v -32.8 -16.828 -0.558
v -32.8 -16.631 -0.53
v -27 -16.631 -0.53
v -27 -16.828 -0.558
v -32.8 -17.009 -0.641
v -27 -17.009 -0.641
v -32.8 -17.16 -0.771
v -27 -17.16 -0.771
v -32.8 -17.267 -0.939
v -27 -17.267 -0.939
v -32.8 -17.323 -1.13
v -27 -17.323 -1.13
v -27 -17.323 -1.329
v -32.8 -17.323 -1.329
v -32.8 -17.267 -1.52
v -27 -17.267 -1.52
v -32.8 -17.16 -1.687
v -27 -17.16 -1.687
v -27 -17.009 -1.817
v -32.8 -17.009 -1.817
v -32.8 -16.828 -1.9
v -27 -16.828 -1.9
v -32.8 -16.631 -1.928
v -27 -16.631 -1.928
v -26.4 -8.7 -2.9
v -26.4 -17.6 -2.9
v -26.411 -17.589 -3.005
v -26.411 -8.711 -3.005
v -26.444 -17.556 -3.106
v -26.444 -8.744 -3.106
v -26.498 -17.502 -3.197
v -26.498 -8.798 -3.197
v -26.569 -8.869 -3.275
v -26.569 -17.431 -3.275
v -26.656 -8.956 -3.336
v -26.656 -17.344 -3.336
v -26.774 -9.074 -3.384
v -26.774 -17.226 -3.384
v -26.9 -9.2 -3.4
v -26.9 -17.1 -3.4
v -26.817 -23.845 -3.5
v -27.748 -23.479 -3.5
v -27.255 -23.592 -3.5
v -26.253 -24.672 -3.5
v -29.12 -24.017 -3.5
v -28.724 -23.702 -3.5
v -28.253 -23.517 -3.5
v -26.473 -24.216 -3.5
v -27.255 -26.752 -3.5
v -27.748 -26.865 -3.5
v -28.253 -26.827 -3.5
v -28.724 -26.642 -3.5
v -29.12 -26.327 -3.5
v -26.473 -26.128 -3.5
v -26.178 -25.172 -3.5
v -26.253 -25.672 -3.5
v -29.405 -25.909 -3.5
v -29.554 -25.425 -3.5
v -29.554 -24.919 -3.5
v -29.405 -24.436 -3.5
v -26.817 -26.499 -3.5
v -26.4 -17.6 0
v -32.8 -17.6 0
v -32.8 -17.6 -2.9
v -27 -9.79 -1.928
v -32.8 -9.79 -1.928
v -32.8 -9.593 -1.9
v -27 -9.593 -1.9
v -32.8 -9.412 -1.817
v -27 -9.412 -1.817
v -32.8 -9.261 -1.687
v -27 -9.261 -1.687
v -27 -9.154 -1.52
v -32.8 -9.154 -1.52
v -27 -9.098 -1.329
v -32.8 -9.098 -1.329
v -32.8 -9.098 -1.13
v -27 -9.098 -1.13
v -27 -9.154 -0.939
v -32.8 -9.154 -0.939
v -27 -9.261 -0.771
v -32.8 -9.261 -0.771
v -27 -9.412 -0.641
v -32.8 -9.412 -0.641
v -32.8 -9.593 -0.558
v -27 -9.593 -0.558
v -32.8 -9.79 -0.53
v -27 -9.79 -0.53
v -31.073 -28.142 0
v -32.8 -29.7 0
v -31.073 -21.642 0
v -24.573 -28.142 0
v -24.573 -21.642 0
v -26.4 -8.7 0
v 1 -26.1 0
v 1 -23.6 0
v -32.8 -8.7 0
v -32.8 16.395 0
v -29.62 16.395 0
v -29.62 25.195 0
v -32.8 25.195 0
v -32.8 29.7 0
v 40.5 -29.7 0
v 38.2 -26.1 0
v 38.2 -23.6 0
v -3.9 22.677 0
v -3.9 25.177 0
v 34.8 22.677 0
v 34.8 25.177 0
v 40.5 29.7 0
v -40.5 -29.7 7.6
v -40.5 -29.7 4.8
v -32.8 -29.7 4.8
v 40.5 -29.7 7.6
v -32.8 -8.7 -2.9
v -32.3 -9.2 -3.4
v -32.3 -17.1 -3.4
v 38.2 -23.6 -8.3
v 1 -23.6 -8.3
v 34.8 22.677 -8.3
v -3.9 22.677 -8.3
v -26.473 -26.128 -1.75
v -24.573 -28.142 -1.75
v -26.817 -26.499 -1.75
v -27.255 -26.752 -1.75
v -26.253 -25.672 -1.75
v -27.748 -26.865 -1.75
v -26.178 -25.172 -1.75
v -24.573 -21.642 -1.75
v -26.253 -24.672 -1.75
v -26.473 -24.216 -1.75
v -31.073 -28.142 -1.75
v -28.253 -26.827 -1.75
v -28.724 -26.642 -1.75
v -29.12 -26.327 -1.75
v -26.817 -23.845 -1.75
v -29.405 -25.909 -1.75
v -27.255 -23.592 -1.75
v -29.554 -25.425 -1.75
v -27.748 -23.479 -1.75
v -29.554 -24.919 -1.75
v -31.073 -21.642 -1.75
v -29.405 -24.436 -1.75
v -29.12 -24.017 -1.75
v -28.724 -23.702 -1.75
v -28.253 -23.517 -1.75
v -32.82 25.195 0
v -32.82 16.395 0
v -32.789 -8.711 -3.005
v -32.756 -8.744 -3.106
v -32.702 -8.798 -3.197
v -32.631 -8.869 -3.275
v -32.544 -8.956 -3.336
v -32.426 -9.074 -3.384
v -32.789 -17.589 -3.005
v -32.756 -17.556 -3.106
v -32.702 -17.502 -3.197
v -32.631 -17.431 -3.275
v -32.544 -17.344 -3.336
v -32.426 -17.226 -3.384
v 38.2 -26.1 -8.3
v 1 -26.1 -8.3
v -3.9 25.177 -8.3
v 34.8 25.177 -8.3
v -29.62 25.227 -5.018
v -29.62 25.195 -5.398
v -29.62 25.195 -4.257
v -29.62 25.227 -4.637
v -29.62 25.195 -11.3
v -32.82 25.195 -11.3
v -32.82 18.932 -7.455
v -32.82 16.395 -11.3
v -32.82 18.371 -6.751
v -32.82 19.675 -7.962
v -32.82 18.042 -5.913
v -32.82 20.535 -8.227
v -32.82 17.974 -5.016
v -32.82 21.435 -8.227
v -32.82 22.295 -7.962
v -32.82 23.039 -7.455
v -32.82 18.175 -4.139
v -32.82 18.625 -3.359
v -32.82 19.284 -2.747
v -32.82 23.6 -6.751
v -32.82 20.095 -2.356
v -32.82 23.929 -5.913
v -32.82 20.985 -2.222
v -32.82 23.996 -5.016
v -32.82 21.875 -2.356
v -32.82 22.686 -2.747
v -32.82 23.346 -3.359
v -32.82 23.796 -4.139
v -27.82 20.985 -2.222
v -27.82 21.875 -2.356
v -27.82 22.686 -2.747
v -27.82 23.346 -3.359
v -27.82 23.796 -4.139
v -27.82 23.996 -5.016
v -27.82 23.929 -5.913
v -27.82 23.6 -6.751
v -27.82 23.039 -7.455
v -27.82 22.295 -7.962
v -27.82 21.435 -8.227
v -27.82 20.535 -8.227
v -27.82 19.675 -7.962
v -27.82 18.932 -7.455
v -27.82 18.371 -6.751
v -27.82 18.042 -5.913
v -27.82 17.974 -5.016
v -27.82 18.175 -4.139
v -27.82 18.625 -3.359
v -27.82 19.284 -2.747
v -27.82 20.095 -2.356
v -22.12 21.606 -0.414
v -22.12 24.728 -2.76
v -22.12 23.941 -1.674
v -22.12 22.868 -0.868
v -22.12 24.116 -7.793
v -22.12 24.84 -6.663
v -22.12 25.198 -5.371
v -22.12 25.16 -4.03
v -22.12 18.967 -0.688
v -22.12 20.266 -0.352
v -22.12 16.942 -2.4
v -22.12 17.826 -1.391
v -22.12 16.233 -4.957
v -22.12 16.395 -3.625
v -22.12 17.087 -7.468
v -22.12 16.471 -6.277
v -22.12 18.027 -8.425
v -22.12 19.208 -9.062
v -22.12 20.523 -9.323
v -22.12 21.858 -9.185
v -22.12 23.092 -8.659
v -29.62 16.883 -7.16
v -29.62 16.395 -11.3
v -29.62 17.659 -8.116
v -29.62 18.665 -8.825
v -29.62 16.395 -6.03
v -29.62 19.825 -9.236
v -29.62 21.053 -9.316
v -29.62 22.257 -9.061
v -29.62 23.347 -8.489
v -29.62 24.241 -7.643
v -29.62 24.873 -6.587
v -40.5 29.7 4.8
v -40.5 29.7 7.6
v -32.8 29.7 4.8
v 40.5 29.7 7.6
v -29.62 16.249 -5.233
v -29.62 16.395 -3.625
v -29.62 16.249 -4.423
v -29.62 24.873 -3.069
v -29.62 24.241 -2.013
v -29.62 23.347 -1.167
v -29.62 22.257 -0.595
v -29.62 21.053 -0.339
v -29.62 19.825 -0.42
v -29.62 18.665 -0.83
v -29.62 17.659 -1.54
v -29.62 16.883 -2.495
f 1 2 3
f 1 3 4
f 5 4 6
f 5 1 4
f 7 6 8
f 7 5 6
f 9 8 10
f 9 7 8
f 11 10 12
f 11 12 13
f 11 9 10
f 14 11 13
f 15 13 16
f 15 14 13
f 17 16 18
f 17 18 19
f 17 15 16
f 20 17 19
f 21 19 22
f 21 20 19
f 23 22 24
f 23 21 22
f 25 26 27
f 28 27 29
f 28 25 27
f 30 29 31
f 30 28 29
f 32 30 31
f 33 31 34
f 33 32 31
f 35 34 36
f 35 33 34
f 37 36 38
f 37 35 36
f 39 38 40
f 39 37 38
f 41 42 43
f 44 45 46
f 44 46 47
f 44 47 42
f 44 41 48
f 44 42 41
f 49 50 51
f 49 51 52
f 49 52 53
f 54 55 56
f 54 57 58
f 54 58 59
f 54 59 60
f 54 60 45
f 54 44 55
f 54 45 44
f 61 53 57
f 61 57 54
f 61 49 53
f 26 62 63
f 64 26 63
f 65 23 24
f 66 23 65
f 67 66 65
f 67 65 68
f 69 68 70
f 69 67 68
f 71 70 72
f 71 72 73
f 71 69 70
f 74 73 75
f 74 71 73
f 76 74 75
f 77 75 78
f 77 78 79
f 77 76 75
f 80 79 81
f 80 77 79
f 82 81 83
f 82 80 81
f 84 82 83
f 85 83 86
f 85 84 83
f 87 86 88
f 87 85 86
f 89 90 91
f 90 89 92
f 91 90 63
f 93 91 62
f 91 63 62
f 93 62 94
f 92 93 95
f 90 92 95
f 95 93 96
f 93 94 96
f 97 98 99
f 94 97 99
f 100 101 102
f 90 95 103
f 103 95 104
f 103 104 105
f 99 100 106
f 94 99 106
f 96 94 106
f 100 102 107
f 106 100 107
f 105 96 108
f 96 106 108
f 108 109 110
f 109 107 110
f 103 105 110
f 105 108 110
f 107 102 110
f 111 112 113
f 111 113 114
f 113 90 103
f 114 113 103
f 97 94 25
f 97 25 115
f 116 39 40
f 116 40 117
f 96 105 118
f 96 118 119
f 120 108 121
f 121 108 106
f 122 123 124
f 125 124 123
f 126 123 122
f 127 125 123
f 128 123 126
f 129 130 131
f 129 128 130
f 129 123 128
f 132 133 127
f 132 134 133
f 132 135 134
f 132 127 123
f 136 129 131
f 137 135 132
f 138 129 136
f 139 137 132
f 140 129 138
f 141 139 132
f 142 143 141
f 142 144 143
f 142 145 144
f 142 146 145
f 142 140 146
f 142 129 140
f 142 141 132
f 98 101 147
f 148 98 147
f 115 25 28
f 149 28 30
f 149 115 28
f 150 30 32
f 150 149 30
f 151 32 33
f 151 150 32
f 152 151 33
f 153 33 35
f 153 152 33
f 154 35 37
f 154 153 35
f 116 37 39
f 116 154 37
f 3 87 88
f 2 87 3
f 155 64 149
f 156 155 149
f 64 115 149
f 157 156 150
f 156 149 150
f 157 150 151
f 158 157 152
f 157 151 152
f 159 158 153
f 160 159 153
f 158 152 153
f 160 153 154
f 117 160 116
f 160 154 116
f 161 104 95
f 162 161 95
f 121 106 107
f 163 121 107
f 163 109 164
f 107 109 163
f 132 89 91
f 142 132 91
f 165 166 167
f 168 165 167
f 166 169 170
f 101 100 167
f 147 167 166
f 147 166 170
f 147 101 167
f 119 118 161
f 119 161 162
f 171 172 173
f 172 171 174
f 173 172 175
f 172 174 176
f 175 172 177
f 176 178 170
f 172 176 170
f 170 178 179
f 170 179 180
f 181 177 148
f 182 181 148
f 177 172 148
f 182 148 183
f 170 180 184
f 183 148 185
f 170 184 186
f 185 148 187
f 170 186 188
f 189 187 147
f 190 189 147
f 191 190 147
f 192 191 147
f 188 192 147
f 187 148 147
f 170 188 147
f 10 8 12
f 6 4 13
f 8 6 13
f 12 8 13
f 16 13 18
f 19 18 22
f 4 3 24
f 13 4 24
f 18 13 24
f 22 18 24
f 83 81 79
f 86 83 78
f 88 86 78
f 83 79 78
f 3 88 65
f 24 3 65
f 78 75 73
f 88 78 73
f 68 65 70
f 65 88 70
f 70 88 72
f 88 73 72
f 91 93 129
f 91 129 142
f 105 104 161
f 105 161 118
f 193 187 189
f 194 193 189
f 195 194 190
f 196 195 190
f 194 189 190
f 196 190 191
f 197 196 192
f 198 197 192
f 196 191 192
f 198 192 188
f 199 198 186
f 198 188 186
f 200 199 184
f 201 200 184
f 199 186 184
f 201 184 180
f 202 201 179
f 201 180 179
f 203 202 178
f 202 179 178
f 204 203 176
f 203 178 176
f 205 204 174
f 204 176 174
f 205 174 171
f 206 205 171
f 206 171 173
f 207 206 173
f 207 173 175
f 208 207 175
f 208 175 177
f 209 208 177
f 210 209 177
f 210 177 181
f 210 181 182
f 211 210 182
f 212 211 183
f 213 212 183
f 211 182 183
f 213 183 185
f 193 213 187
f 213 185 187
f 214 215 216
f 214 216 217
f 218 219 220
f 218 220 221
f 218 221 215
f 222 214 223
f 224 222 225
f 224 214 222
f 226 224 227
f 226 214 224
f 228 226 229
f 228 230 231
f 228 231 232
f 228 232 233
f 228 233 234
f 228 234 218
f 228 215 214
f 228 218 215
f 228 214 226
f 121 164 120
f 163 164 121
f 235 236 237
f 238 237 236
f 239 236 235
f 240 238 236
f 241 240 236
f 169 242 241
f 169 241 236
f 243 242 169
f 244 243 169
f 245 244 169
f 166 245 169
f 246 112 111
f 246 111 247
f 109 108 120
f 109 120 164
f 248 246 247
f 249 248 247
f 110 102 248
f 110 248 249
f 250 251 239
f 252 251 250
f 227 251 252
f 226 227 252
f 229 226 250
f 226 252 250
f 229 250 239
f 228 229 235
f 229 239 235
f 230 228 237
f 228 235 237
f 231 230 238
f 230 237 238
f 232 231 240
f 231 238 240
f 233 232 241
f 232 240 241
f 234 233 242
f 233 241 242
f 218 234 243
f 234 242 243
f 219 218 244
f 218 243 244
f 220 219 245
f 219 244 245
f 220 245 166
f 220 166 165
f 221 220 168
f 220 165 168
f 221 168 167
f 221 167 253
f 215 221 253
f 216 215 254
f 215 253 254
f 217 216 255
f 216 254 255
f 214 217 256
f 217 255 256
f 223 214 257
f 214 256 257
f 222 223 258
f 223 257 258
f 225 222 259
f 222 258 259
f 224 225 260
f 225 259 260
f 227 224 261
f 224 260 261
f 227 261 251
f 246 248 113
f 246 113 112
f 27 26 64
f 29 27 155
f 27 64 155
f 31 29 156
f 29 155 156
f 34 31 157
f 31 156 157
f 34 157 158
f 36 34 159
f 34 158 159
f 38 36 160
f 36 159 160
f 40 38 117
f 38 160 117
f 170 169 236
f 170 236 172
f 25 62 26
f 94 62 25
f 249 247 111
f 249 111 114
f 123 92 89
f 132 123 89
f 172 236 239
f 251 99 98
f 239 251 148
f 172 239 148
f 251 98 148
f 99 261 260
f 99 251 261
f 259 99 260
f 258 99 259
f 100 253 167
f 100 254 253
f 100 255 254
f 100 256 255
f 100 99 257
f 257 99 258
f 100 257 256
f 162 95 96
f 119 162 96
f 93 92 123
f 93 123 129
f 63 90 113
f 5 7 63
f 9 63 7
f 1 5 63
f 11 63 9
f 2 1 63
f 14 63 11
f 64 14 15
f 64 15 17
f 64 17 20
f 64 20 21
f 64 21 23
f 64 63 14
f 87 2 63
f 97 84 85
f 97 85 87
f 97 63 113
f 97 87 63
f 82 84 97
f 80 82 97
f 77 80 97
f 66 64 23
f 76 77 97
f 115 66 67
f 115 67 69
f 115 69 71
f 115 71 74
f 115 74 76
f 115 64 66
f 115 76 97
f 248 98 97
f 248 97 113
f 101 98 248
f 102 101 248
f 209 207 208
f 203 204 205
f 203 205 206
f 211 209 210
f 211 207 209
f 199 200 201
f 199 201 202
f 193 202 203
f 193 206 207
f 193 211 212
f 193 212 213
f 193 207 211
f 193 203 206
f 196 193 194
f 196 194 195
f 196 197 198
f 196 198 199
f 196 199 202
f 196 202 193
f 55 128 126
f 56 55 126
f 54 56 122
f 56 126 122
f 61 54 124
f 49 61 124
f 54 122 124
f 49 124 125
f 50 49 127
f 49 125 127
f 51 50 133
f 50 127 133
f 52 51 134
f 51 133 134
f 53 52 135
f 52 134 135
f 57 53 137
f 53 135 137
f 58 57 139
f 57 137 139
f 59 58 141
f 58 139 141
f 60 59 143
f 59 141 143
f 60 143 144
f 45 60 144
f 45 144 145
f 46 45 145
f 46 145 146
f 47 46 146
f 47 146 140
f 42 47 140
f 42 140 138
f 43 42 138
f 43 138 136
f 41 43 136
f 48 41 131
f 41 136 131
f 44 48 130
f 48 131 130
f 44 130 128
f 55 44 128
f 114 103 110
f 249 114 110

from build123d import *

# Parameters (mm, degrees)
SKETCH1_W               = 81
SKETCH1_H               = 59.4
CARRIER_BASE_DEPTH      = 7.6
SKETCH2_W               = 7.7
SKETCH2_H               = 59.4
CUT_EXTRUDE1_DEPTH      = 4.8
SKETCH3_W               = 38.7
SKETCH3_H               = 2.5
ANALOG_POWER_BANK_DEPTH = 8.3
SKETCH4_W               = 37.2
SKETCH4_H               = 2.5
DIGITAL_BANK_DEPTH      = 8.3
SKETCH5_W               = 3.2
SKETCH5_H               = 8.8
F_5V_INPUT_DEPTH        = 11.3
SKETCH7_R               = 4.5
BOSS_EXTRUDE6_DEPTH     = 7.5
SKETCH8_R               = 3.019250474
CUT_EXTRUDE2_DEPTH      = 5
SKETCH9_W               = 6.4
SKETCH9_H               = 8.9
USB_C_DEPTH             = 3.4
FILLET3_R               = 0.5
CUT_EXTRUDE3_DEPTH      = 5.8
SKETCH11_W              = 6.5
SKETCH11_H              = 6.5
BOSS_EXTRUDE12_DEPTH    = 1.75
SKETCH12_R              = 1.697531851
RESET_DEPTH             = 1.75


with BuildPart() as part:
    # Sketch1 → Carrier / Base (new body)
    with BuildSketch(Plane.XY):
        Rectangle(SKETCH1_W, SKETCH1_H)
    extrude(amount=CARRIER_BASE_DEPTH)

    # Sketch2 → Cut-Extrude1 (cut)
    with BuildSketch(Plane(origin=(0, 0, 0), x_dir=(-1, 0, 0), z_dir=(0, 0, -1))):
        with Locations((36.65, 0)):
            Rectangle(SKETCH2_W, SKETCH2_H)
    extrude(amount=-CUT_EXTRUDE1_DEPTH, mode=Mode.SUBTRACT)

    # Sketch3 → Analog / Power Bank (add)
    with BuildSketch(Plane(origin=(0, 0, 0), x_dir=(-1, 0, 0), z_dir=(0, 0, -1))):
        with Locations((-15.45, 23.926979164)):
            Rectangle(SKETCH3_W, SKETCH3_H)
    extrude(amount=ANALOG_POWER_BANK_DEPTH)

    # Sketch4 → Digital Bank (add)
    with BuildSketch(Plane(origin=(0, 0, 0), x_dir=(-1, 0, 0), z_dir=(0, 0, -1))):
        with Locations((-19.6, -24.85)):
            Rectangle(SKETCH4_W, SKETCH4_H)
    extrude(amount=DIGITAL_BANK_DEPTH)

    # Sketch5 → 5V Input (add)
    with BuildSketch(Plane(origin=(0, 0, 0), x_dir=(-1, 0, 0), z_dir=(0, 0, -1))):
        with Locations((31.21956927, 20.79458393)):
            Rectangle(SKETCH5_W, SKETCH5_H)
    extrude(amount=F_5V_INPUT_DEPTH)

    # Sketch7 → Boss-Extrude6 (add)
    with BuildSketch(Plane(origin=(-29.61956927, 0, 0), x_dir=(0, 0, -1), z_dir=(1, 0, 0))):
        with Locations(Location((4.827826856, 20.730910649, 0), (0, 0, 254.499508307))):
            Circle(SKETCH7_R)
    extrude(amount=BOSS_EXTRUDE6_DEPTH)

    # Sketch8 → Cut-Extrude2 (cut)
    with BuildSketch(Plane.ZY.offset(32.81956927)):
        with Locations((-5.241560024, 20.985277651)):
            Circle(SKETCH8_R)
    extrude(amount=-CUT_EXTRUDE2_DEPTH, mode=Mode.SUBTRACT)

    # Sketch9 → USB-C (add)
    with BuildSketch(Plane(origin=(0, 0, 0), x_dir=(-1, 0, 0), z_dir=(0, 0, -1))):
        with Locations((29.6, -13.15)):
            Rectangle(SKETCH9_W, SKETCH9_H)
    extrude(amount=USB_C_DEPTH)

    # Fillet3
    fillet3_edges = [part.edges().sort_by_distance(p)[0] for p in [
        (-32.8, -13.15, -3.4),
        (-29.6, -8.7, -3.4),
        (-26.4, -13.15, -3.4),
        (-29.6, -17.6, -3.4),
    ]]
    fillet(fillet3_edges, radius=FILLET3_R)

    # Sketch10 → Cut-Extrude3 (cut)
    with BuildSketch(Plane.ZY.offset(32.8)):
        with BuildLine():
            Line((-1.928214934, -16.631364992), (-1.928214934, -9.789588696))
            ThreePointArc((-1.928214934, -9.789588696), (-1.229070102, -9.090443863), (-0.52992527, -9.789588696))
            Line((-0.52992527, -9.789588696), (-0.52992527, -16.631364992))
            ThreePointArc((-0.52992527, -16.631364992), (-1.229070102, -17.330509824), (-1.928214934, -16.631364992))
        make_face()
    extrude(amount=-CUT_EXTRUDE3_DEPTH, mode=Mode.SUBTRACT)

    # Sketch11 → Boss-Extrude12 (add)
    with BuildSketch(Plane(origin=(0, 0, 0), x_dir=(-1, 0, 0), z_dir=(0, 0, -1))):
        with Locations((27.822665658, -24.892209285)):
            Rectangle(SKETCH11_W, SKETCH11_H)
    extrude(amount=BOSS_EXTRUDE12_DEPTH)

    # Sketch12 → Reset (add)
    with BuildSketch(Plane(origin=(0, 0, -1.75), x_dir=(-1, 0, 0), z_dir=(0, 0, -1))):
        with Locations(Location((27.87525987, -25.172094467, 0), (0, 0, 180))):
            Circle(SKETCH12_R)
    extrude(amount=RESET_DEPTH)


solid = part.part
